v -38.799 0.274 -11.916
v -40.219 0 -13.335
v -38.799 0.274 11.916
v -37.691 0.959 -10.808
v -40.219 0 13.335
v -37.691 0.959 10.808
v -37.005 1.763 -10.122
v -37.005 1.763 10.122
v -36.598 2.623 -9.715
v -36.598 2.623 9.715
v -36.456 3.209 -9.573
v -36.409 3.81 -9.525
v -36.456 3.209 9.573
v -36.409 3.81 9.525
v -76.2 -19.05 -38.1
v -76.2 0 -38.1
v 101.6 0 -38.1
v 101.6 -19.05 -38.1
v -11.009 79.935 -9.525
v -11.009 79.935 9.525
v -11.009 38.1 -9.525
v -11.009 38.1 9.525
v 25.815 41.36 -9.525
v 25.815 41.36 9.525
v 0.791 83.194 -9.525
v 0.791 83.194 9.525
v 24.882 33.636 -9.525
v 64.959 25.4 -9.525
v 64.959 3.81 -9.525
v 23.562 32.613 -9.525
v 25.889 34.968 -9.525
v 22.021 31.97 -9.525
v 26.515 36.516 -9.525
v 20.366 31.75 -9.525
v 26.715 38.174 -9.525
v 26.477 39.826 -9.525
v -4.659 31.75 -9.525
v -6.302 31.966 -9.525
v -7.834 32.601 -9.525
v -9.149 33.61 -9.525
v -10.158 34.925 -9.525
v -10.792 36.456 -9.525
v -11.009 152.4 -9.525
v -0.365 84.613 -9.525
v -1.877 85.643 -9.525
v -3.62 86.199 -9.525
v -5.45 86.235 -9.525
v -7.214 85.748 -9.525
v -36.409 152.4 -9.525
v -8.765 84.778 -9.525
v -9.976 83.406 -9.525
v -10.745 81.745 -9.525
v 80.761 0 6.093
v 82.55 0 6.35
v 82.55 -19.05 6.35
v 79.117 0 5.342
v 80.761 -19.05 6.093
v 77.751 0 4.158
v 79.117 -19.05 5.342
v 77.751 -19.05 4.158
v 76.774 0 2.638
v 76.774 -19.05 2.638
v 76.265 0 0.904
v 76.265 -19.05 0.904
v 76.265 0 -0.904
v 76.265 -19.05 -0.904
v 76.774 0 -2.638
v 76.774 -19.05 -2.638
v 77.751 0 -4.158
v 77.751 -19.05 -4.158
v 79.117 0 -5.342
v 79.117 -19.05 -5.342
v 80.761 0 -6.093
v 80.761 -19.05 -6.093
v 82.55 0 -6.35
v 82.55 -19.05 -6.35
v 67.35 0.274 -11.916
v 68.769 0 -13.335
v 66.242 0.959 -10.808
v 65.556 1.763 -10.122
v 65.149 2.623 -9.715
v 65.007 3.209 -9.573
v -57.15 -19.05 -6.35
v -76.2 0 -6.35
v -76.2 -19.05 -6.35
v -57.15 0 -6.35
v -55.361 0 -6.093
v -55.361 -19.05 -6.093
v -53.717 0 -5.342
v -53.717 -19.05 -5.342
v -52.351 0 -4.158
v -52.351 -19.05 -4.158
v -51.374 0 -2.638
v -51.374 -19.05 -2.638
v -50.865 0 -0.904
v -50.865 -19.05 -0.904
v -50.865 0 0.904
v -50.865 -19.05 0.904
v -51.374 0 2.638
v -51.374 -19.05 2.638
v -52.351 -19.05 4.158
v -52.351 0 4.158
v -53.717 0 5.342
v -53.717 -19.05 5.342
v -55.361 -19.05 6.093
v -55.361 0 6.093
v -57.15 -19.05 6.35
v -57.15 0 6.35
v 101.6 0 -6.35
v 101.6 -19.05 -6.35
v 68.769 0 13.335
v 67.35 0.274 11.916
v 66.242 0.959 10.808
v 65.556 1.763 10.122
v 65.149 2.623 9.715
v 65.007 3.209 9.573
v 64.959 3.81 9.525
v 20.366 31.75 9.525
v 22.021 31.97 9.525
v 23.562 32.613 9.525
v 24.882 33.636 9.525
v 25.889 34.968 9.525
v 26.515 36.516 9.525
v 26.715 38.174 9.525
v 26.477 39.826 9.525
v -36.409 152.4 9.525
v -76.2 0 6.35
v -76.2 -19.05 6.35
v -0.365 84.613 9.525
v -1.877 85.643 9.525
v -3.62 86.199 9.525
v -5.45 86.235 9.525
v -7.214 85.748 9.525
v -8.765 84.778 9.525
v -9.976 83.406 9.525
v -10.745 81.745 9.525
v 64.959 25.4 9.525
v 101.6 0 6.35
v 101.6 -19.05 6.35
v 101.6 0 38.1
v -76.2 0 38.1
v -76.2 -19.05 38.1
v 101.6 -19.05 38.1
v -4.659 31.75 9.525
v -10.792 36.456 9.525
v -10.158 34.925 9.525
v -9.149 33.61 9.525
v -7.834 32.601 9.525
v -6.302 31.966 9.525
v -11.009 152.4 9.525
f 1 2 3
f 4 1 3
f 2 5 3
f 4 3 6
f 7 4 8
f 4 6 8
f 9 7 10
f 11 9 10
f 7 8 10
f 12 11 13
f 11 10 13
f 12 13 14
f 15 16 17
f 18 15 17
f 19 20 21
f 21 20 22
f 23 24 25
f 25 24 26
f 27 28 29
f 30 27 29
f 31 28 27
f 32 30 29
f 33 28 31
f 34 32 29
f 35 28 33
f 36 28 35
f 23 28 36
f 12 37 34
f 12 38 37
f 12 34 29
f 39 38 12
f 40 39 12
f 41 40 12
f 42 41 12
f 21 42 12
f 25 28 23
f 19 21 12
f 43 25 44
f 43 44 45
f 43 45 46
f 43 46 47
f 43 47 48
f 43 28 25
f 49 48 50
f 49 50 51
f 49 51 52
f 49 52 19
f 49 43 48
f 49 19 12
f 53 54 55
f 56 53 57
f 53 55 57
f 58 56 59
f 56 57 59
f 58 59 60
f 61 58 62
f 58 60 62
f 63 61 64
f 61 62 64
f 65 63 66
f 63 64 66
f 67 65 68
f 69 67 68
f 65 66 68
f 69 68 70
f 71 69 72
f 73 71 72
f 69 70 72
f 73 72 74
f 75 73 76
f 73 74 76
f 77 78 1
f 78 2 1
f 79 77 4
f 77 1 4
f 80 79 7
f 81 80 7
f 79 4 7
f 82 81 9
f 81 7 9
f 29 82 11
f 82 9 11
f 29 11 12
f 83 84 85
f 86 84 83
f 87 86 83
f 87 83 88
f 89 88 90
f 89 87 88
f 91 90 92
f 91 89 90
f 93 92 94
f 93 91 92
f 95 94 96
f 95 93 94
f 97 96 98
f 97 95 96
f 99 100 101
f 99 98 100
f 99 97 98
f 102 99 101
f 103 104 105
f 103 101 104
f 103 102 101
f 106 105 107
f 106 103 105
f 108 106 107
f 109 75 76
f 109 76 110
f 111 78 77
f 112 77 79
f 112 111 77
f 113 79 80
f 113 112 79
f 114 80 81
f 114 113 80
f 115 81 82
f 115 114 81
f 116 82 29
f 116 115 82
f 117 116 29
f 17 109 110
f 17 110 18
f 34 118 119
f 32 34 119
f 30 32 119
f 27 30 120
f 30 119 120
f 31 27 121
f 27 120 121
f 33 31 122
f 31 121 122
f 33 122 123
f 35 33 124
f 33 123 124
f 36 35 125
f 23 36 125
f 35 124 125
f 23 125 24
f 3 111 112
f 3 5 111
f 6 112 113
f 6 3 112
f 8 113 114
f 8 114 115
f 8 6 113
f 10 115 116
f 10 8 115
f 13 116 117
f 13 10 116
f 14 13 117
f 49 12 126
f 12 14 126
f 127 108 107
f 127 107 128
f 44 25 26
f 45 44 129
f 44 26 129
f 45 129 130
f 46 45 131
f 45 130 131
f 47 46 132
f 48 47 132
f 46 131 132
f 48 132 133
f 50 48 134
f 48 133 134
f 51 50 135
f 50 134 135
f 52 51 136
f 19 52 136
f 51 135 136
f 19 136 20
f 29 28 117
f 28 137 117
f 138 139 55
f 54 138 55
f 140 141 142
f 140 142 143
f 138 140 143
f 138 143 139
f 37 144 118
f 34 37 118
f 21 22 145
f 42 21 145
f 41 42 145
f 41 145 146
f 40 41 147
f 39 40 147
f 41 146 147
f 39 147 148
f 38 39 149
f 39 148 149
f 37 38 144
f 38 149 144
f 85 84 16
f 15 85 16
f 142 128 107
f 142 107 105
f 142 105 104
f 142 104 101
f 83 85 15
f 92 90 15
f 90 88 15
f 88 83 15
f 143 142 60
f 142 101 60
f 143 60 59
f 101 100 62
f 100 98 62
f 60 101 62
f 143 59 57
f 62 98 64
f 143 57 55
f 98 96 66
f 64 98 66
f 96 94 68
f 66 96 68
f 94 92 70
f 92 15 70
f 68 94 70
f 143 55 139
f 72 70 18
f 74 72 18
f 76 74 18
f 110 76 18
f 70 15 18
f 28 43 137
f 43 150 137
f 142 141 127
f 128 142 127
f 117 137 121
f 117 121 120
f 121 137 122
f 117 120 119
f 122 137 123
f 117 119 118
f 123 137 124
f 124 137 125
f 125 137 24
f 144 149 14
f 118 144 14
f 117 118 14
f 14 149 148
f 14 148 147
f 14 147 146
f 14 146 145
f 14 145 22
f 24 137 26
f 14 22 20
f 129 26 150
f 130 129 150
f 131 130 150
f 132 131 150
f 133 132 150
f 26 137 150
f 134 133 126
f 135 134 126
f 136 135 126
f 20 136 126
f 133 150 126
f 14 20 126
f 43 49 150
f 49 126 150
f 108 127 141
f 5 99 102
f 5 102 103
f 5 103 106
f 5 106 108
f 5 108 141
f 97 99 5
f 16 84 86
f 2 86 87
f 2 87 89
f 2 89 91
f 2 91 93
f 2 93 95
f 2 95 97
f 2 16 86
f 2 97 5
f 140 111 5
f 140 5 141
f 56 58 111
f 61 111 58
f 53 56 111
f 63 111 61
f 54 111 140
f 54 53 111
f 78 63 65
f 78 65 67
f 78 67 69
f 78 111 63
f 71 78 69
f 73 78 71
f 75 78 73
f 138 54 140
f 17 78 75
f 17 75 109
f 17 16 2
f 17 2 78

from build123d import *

# Parameters (mm, degrees)
SKETCH1_W                  = 177.8
SKETCH1_H                  = 76.2
MILLING_SUPPORT_BASE_DEPTH = 19.05
BOLT_SLOT_LEFT_END_DEPTH   = 20.05
BOLT_SLOT_RIGHT_END_DEPTH  = 20.05
OUTER_TRIANGLE_DEPTH       = 9.525
INNER_TRIANGLE_DEPTH       = 48.625
FILLET_AT_TRIANGLE_BASE_R  = 3.81


with BuildPart() as part:
    # Sketch1 → Milling Support Base (new body)
    with BuildSketch(Plane(origin=(0, 0, 0), x_dir=(1, 0, 0), z_dir=(0, 1, 0))):
        with Locations((12.7, 0)):
            Rectangle(SKETCH1_W, SKETCH1_H)
    extrude(amount=-MILLING_SUPPORT_BASE_DEPTH)

    # Sketch2 → Bolt Slot Left End (cut, through all)
    with BuildSketch(Plane(origin=(0, 0, 0), x_dir=(1, 0, 0), z_dir=(0, 1, 0))):
        with BuildLine():
            Line((-76.2, 6.35), (-57.15, 6.35))
            ThreePointArc((-57.15, 6.35), (-50.8, 0), (-57.15, -6.35))
            Line((-57.15, -6.35), (-76.2, -6.35))
            Line((-76.2, -6.35), (-76.2, 6.35))
        make_face()
    extrude(amount=-BOLT_SLOT_LEFT_END_DEPTH, mode=Mode.SUBTRACT)

    # Sketch3 → Bolt Slot Right End (cut, through all)
    with BuildSketch(Plane.XZ.offset(19.05)):
        with BuildLine():
            Line((101.6, 6.35), (82.55, 6.35))
            ThreePointArc((82.55, 6.35), (76.2, 0), (82.55, -6.35))
            Line((82.55, -6.35), (101.6, -6.35))
            Line((101.6, -6.35), (101.6, 6.35))
        make_face()
    extrude(amount=-BOLT_SLOT_RIGHT_END_DEPTH, mode=Mode.SUBTRACT)

    # Sketch4 → Outer Triangle (add, symmetric)
    with BuildSketch(Plane.XY):
        Polygon((-36.408550143, 0), (-36.408550143, 152.4), (-11.008550143, 152.4), (64.959238023, 25.4), (64.959238023, 0), align=None)
    extrude(amount=OUTER_TRIANGLE_DEPTH, both=True)

    # Sketch5 → Inner Triangle (cut, through all)
    with BuildSketch(Plane.XY.offset(9.525)):
        with BuildLine():
            Line((-4.658550143, 31.75), (20.365749185, 31.75))
            ThreePointArc((20.365749185, 31.75), (25.889412512, 34.967645701), (25.81522023, 41.359718598))
            Line((25.81522023, 41.359718598), (0.790920902, 83.194371039))
            ThreePointArc((0.790920902, 83.194371039), (-6.349460972, 86.055381202), (-11.008550143, 79.934652441))
            Line((-11.008550143, 79.934652441), (-11.008550143, 38.1))
            ThreePointArc((-11.008550143, 38.1), (-9.148678203, 33.609871939), (-4.658550143, 31.75))
        make_face()
    extrude(amount=-INNER_TRIANGLE_DEPTH, mode=Mode.SUBTRACT)

    # Fillet at Triangle base
    fillet_at_triangle_base_edges = [part.edges().sort_by_distance(p)[0] for p in [
        (14.27534394, 0, -9.525),
        (-36.408550143, 0, 0),
        (64.959238023, 0, 0),
        (14.27534394, 0, 9.525),
    ]]
    fillet(fillet_at_triangle_base_edges, radius=FILLET_AT_TRIANGLE_BASE_R)


solid = part.part
